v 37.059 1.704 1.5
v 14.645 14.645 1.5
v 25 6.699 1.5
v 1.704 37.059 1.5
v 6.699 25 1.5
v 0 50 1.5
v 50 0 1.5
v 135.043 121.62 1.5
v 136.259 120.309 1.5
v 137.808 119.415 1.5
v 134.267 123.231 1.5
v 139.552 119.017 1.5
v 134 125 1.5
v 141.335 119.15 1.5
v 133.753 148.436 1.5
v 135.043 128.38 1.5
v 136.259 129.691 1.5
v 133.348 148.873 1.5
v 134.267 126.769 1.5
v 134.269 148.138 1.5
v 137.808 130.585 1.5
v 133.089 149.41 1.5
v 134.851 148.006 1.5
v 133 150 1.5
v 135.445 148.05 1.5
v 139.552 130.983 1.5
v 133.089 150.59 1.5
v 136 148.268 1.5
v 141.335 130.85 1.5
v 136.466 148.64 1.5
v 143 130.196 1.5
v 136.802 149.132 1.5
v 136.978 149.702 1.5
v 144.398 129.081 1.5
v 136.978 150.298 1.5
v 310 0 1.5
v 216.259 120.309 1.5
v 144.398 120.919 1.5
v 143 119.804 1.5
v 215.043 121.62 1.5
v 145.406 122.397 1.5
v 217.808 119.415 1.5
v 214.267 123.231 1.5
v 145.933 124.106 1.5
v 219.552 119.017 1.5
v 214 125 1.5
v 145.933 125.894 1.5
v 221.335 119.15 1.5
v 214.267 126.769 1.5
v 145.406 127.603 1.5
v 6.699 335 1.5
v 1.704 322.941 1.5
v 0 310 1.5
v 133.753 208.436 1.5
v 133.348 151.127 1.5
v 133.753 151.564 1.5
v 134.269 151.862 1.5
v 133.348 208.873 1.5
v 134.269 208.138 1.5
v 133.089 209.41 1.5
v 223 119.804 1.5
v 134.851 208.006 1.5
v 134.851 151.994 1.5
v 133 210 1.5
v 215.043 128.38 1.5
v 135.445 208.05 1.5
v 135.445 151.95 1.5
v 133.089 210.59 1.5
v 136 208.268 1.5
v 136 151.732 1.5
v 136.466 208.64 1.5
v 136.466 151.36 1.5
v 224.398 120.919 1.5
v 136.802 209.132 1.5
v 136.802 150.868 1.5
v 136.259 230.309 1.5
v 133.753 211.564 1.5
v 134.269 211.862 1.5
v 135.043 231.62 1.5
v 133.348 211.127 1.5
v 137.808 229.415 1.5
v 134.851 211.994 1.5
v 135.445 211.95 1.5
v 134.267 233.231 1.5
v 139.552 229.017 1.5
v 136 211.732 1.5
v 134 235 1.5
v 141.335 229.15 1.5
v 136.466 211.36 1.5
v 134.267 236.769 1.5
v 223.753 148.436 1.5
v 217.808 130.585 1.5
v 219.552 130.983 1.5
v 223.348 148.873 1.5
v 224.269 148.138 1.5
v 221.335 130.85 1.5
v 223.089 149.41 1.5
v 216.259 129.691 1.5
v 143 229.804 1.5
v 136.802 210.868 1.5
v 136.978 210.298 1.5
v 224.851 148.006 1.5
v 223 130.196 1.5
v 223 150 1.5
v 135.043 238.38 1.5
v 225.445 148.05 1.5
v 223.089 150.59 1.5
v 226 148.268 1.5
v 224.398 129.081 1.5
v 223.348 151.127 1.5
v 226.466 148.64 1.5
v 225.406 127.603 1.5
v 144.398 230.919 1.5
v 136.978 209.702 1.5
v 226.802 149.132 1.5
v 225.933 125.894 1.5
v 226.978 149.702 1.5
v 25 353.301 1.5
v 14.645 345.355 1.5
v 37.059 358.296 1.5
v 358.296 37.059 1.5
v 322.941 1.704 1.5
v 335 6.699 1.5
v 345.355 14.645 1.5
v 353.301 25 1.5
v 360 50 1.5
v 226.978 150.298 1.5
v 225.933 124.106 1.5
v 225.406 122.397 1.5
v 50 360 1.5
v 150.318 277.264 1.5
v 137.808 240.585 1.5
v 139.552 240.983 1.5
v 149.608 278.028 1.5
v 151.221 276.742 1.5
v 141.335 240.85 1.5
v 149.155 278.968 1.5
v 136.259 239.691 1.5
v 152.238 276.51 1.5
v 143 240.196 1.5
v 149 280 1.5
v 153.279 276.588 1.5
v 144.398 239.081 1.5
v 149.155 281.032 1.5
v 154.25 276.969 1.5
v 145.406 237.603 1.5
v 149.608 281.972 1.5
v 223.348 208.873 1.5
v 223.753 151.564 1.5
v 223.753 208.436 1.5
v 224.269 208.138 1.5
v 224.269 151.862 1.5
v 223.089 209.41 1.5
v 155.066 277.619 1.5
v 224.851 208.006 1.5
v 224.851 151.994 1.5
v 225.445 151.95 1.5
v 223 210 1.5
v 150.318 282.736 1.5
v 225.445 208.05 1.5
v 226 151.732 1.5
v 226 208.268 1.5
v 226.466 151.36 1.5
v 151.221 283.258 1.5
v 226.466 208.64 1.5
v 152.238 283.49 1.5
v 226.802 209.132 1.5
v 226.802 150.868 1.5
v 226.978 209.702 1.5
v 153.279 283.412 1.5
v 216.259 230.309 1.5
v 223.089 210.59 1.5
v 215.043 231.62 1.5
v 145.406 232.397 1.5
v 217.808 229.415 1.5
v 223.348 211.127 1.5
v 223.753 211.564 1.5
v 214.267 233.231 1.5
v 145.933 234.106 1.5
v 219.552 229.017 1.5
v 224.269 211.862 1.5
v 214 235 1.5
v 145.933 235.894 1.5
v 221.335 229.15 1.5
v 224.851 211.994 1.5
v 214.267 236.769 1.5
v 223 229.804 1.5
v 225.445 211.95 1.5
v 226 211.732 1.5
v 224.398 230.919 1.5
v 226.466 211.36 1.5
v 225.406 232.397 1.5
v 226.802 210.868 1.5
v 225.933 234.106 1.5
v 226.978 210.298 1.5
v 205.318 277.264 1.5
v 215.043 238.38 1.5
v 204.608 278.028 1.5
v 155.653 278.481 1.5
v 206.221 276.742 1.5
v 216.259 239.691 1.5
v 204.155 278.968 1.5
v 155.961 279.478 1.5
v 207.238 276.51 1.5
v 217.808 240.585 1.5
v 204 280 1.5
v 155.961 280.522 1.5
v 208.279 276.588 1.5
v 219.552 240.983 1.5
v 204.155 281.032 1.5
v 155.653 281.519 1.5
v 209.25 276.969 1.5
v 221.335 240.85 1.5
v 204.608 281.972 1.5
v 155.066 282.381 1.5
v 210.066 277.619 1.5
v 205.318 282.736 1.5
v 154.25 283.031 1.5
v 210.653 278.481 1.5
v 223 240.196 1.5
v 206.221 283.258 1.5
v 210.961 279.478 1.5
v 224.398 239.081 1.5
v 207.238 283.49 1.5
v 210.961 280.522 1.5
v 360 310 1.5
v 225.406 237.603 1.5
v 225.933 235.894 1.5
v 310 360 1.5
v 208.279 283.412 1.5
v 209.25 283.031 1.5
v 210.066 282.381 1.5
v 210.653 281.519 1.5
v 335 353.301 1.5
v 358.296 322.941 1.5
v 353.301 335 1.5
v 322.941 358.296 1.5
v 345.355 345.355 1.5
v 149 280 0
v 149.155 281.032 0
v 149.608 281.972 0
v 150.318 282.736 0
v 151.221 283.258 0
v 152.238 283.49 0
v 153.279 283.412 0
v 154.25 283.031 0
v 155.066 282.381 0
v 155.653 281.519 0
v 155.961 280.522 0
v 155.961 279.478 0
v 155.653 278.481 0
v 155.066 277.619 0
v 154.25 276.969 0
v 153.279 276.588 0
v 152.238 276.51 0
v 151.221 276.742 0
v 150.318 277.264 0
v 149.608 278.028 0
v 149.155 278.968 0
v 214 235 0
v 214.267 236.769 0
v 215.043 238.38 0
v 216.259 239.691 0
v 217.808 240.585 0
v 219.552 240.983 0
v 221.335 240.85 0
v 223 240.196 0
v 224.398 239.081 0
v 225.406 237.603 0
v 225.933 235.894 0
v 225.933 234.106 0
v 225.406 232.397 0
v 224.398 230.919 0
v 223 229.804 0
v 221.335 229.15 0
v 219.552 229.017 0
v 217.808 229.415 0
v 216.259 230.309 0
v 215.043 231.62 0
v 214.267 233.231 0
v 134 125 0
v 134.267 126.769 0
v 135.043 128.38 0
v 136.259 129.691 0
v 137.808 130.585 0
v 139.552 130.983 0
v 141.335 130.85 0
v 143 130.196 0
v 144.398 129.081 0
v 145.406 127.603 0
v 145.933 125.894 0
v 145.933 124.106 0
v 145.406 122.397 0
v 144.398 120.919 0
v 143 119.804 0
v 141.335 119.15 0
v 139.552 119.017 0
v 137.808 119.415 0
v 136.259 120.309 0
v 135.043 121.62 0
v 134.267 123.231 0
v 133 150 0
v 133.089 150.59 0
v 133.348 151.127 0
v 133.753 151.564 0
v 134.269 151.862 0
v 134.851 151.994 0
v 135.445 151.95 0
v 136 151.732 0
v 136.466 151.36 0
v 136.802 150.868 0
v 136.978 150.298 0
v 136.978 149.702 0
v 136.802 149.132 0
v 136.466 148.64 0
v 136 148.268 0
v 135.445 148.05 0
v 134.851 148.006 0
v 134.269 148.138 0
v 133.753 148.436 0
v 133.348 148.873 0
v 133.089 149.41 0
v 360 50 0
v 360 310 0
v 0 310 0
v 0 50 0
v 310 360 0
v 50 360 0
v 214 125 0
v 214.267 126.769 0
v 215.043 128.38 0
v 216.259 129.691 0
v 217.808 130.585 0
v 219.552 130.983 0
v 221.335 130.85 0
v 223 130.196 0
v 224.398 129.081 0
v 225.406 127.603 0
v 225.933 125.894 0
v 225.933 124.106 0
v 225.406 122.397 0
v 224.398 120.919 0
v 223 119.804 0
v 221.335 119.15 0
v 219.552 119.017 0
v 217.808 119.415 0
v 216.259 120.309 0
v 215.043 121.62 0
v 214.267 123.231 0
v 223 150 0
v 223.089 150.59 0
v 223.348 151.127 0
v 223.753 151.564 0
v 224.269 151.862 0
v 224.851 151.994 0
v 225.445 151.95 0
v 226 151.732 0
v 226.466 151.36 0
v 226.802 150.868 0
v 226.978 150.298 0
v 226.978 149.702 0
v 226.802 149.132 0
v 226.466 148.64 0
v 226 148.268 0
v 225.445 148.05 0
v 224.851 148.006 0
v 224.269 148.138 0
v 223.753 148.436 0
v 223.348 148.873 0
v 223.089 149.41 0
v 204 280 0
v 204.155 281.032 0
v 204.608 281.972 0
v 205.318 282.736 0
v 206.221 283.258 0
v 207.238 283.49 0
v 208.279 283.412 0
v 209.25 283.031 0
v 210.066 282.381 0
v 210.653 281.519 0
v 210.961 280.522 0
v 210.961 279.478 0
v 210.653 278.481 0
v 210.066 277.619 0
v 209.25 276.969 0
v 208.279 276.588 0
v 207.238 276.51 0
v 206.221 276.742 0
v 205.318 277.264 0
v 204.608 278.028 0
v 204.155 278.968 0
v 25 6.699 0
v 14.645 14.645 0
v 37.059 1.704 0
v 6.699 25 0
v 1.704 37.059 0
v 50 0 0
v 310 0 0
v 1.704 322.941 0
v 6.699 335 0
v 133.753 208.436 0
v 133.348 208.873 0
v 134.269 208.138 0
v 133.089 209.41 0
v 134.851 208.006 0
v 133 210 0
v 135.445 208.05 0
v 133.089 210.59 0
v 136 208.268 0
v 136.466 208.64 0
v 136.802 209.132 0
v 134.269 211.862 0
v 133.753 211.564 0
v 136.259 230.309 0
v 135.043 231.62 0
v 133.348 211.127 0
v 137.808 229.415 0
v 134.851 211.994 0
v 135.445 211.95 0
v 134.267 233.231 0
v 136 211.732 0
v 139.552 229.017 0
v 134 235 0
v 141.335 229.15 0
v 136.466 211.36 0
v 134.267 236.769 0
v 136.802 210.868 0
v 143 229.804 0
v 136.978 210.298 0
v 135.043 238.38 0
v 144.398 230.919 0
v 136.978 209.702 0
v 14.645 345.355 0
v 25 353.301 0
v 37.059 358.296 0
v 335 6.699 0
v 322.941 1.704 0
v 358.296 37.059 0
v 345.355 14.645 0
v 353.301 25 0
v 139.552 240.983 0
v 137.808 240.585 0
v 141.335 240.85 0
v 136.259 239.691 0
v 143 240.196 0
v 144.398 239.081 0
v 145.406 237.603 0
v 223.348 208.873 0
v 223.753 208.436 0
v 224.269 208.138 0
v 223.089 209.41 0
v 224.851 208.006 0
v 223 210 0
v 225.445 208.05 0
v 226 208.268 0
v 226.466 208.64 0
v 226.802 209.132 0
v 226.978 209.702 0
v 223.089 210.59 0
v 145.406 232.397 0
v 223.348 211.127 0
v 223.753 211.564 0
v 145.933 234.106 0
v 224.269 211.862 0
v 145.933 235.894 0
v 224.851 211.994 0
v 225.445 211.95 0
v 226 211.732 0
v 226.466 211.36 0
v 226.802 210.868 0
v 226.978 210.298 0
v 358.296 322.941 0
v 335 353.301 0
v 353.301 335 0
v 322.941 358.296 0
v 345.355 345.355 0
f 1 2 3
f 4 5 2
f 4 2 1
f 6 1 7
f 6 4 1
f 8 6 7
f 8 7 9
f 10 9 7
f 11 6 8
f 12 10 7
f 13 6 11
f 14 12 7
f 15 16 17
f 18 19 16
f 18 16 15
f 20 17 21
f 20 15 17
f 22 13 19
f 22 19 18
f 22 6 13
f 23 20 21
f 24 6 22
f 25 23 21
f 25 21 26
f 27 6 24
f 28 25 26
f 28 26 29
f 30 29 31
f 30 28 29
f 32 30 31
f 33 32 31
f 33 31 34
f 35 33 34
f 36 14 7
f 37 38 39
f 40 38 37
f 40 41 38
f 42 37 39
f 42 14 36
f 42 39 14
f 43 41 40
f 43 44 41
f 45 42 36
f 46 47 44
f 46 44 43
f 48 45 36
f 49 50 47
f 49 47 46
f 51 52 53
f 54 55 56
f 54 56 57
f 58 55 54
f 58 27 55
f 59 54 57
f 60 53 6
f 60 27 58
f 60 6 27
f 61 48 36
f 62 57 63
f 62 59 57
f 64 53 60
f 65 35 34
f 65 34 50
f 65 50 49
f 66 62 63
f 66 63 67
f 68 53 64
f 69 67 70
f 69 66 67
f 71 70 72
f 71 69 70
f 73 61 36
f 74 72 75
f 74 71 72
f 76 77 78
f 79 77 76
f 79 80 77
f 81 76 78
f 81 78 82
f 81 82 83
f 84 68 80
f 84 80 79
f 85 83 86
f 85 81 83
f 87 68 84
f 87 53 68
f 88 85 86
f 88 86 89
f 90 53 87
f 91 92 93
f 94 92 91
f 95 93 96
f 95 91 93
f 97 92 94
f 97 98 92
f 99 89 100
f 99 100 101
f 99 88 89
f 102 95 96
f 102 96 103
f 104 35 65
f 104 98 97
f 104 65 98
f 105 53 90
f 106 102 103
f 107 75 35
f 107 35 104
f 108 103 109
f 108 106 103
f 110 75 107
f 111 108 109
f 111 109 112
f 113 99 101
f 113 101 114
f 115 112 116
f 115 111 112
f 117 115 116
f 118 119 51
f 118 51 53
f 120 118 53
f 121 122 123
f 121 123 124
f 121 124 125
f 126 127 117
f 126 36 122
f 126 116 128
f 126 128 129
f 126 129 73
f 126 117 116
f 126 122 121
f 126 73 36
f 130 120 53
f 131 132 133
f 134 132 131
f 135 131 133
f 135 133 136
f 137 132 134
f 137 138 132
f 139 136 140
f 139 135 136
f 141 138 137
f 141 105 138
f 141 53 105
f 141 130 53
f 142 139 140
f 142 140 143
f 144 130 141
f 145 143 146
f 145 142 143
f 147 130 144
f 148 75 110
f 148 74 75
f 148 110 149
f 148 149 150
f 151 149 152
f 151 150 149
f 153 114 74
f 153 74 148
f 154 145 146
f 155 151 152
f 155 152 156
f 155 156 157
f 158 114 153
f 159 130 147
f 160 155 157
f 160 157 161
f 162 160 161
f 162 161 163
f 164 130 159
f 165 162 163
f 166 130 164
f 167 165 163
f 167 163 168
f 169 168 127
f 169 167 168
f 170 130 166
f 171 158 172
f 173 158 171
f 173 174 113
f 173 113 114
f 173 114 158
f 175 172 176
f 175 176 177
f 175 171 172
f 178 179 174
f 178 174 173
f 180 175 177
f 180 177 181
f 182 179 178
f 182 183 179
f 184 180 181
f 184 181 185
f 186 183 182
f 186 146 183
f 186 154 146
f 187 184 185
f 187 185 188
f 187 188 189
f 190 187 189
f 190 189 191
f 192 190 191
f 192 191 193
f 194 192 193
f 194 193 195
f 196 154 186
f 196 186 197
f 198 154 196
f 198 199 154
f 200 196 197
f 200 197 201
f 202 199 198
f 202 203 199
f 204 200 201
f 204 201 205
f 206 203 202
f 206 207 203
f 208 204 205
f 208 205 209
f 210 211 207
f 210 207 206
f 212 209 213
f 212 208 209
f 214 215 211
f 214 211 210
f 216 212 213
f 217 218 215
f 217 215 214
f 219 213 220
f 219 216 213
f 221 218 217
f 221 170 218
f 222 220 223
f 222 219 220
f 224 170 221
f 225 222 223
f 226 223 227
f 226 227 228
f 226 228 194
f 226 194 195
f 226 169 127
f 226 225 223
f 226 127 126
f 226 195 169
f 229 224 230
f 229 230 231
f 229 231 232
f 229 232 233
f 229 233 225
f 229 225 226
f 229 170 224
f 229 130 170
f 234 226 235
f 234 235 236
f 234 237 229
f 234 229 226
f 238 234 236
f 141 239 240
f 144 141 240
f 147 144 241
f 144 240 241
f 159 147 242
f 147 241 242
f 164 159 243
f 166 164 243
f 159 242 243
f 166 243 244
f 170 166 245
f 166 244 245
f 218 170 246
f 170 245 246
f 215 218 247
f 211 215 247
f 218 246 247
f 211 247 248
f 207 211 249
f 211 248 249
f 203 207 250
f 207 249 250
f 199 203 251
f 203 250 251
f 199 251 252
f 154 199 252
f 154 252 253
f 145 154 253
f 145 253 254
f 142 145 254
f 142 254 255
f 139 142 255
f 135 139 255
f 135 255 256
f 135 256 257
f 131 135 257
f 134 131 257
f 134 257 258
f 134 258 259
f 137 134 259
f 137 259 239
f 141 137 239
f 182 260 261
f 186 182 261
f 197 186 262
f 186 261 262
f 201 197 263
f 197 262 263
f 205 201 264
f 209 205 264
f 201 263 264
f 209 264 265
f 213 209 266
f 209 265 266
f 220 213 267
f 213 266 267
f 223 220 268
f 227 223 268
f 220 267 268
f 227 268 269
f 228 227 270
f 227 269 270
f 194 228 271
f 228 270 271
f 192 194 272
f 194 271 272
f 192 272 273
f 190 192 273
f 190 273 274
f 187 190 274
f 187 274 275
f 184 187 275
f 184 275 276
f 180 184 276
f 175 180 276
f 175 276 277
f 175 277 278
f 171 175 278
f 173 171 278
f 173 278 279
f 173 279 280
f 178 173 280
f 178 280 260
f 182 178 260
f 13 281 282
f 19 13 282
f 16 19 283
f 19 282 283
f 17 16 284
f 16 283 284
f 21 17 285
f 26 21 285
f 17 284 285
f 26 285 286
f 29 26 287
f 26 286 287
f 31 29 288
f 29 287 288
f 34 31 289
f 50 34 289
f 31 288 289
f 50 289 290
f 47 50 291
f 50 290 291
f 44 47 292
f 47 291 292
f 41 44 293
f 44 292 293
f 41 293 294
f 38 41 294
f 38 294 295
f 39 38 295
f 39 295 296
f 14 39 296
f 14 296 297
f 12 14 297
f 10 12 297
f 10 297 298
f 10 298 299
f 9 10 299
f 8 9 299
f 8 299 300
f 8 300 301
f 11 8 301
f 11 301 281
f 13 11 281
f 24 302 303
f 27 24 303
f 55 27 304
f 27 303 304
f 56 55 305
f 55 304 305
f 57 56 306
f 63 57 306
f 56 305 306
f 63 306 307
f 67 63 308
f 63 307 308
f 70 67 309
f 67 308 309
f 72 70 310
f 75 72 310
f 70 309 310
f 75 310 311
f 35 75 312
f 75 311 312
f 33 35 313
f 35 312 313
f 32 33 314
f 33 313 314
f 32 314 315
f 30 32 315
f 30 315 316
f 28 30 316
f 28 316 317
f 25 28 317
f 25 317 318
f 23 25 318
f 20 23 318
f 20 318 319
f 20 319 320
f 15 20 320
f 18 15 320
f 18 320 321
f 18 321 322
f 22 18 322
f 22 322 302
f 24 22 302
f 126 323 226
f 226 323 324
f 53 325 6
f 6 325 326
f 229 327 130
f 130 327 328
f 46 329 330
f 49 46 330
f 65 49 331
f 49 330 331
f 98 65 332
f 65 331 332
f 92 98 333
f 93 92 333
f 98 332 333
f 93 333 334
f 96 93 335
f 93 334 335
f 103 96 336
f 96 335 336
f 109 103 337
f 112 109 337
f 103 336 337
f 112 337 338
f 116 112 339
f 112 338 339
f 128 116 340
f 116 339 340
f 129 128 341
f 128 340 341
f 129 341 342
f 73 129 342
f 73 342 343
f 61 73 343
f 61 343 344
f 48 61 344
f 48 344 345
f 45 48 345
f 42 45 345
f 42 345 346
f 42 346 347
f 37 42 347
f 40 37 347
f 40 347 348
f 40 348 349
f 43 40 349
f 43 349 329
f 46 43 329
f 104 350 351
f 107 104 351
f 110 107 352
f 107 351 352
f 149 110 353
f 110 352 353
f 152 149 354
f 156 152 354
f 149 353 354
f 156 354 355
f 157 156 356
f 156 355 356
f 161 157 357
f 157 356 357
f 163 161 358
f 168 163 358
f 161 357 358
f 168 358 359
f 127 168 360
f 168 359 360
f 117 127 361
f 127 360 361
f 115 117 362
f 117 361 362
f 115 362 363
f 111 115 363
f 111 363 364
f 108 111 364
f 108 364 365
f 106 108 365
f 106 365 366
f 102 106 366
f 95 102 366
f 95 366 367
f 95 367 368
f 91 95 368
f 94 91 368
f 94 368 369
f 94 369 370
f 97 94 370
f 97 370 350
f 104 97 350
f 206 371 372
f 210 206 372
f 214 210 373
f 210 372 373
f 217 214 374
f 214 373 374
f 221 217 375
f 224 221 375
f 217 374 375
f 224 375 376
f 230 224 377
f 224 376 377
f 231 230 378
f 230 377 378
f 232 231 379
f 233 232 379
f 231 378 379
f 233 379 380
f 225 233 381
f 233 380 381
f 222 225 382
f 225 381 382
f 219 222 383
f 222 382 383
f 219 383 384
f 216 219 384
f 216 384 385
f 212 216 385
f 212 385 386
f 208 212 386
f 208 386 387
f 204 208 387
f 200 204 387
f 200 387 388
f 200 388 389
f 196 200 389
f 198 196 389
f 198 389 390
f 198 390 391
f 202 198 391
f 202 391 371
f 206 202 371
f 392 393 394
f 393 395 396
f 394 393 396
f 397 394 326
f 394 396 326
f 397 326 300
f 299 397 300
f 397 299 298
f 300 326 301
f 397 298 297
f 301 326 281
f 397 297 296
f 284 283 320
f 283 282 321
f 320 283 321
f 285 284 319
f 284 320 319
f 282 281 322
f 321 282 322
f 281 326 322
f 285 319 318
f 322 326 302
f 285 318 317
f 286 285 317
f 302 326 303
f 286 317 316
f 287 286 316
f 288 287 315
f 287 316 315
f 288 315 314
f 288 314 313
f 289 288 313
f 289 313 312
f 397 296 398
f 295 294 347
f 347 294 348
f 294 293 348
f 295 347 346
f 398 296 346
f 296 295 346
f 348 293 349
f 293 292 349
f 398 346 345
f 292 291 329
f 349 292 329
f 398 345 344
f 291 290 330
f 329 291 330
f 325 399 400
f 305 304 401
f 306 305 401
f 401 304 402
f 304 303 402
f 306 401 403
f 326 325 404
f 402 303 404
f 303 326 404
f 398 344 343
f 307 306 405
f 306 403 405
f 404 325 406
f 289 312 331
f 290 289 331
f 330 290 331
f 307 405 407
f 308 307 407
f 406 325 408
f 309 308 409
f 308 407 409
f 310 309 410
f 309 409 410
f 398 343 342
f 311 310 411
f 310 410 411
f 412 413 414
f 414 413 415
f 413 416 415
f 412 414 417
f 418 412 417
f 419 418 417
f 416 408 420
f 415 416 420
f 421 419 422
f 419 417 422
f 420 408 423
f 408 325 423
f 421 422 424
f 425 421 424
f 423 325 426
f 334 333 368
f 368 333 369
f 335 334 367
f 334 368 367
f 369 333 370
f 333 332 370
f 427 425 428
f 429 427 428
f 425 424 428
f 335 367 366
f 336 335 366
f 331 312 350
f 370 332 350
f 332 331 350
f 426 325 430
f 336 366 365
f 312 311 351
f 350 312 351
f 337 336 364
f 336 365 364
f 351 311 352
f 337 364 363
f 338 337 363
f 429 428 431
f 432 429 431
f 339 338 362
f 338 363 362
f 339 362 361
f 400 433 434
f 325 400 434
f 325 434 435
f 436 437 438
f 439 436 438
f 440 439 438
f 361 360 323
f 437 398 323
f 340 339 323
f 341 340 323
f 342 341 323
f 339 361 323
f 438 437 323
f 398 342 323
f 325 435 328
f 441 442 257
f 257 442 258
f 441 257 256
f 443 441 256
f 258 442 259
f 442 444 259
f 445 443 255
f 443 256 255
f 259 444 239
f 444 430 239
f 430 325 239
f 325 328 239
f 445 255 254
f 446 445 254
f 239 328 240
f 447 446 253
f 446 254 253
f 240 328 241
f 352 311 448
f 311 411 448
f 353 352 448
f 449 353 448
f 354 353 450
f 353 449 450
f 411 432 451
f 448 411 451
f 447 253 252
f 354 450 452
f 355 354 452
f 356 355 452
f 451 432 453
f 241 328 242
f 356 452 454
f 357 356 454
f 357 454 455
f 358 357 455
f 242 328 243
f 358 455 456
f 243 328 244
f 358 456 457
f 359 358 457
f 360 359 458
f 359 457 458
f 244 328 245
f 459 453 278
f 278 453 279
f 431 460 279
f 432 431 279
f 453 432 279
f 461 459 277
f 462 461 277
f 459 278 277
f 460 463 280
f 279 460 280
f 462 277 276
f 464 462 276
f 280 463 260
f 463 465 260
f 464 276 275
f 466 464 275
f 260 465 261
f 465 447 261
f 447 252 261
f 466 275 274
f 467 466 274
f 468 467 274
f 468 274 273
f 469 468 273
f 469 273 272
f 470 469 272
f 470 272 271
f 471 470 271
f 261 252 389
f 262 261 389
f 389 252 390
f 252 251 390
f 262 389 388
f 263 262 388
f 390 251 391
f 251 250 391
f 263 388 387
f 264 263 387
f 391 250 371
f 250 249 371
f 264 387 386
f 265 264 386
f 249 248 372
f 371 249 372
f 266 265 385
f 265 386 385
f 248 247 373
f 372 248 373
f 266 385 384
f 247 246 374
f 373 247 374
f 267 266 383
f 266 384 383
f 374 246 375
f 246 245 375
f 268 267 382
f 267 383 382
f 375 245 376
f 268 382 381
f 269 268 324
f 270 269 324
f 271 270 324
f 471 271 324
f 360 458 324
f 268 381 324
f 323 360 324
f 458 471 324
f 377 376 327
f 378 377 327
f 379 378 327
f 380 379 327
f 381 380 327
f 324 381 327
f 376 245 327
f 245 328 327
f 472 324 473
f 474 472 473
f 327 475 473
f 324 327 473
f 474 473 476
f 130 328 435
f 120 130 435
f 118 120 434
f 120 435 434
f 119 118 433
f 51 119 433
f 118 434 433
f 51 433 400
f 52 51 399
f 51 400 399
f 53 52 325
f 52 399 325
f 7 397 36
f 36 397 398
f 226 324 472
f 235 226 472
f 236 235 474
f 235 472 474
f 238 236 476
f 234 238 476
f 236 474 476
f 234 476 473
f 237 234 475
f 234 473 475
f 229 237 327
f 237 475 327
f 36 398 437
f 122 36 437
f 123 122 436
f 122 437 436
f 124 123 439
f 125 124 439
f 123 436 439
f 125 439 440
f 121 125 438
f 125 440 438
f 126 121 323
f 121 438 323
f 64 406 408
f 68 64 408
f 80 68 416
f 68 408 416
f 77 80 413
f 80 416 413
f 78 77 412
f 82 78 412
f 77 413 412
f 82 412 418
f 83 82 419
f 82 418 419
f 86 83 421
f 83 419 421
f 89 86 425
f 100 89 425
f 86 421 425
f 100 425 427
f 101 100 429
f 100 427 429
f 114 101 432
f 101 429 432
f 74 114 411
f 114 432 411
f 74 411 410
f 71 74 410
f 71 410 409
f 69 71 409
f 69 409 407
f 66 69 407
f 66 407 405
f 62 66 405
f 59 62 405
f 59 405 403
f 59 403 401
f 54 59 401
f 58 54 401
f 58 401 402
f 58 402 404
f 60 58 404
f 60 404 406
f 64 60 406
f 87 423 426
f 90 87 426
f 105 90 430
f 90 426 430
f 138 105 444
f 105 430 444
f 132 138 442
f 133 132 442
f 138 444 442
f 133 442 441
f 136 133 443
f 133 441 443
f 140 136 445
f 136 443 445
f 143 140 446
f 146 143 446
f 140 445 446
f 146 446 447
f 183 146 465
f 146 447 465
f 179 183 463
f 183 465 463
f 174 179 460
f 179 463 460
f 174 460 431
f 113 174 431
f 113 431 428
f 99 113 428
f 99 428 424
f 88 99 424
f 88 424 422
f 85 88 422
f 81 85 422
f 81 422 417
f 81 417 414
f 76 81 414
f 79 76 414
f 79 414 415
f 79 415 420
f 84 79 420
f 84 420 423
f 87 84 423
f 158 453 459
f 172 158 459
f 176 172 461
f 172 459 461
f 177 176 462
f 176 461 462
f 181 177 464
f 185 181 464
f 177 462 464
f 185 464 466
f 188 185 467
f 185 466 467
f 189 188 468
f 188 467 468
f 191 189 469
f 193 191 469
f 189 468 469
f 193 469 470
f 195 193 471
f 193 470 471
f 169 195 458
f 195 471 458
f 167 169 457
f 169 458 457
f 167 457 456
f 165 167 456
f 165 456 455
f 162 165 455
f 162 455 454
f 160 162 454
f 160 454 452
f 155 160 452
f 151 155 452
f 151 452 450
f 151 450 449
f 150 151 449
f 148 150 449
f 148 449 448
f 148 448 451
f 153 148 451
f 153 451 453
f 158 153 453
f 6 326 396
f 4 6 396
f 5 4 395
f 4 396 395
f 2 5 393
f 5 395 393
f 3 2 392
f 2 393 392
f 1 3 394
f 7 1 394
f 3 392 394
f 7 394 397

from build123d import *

# Parameters (mm, degrees)
BOSS_EXTRUDE1_DEPTH      = 1.5
F_4_0_4_DIAMETER_HOLE1_D = 4
F_7_0_7_DIAMETER_HOLE1_D = 7
F_12_0MM_DOWEL_HOLE1_D   = 12


with BuildPart() as part:
    # Sketch1 → Boss-Extrude1 (new body)
    with BuildSketch(Plane.XY):
        with BuildLine():
            Line((50, 0), (310, 0))
            ThreePointArc((310, 0), (345.355339059, 14.644660941), (360, 50))
            Line((360, 50), (360, 310))
            ThreePointArc((360, 310), (345.355339059, 345.355339059), (310, 360))
            Line((310, 360), (50, 360))
            ThreePointArc((50, 360), (14.644660941, 345.355339059), (0, 310))
            Line((0, 310), (0, 50))
            ThreePointArc((0, 50), (14.644660941, 14.644660941), (50, 0))
        make_face()
    extrude(amount=BOSS_EXTRUDE1_DEPTH)

    # Ø4.0 (4) Diameter Hole1 (through all)
    with Locations(Plane(origin=(135, 210, 1.5), x_dir=(1, 0, 0), z_dir=(0, 0, 1))):
        with Locations((0, 0), (90, 0), (90, -60), (0, -60)):
            Hole(F_4_0_4_DIAMETER_HOLE1_D / 2)

    # Ø7.0 (7) Diameter Hole1 (through all)
    with Locations(Plane(origin=(152.5, 280, 1.5), x_dir=(1, 0, 0), z_dir=(0, 0, 1))):
        with Locations((0, 0), (55, 0)):
            Hole(F_7_0_7_DIAMETER_HOLE1_D / 2)

    # Ø12.0mm Dowel Hole1 (through all)
    with Locations(Plane(origin=(140, 235, 1.5), x_dir=(1, 0, 0), z_dir=(0, 0, 1))):
        with Locations((0, 0), (80, 0), (0, -110), (80, -110)):
            Hole(F_12_0MM_DOWEL_HOLE1_D / 2)


solid = part.part
